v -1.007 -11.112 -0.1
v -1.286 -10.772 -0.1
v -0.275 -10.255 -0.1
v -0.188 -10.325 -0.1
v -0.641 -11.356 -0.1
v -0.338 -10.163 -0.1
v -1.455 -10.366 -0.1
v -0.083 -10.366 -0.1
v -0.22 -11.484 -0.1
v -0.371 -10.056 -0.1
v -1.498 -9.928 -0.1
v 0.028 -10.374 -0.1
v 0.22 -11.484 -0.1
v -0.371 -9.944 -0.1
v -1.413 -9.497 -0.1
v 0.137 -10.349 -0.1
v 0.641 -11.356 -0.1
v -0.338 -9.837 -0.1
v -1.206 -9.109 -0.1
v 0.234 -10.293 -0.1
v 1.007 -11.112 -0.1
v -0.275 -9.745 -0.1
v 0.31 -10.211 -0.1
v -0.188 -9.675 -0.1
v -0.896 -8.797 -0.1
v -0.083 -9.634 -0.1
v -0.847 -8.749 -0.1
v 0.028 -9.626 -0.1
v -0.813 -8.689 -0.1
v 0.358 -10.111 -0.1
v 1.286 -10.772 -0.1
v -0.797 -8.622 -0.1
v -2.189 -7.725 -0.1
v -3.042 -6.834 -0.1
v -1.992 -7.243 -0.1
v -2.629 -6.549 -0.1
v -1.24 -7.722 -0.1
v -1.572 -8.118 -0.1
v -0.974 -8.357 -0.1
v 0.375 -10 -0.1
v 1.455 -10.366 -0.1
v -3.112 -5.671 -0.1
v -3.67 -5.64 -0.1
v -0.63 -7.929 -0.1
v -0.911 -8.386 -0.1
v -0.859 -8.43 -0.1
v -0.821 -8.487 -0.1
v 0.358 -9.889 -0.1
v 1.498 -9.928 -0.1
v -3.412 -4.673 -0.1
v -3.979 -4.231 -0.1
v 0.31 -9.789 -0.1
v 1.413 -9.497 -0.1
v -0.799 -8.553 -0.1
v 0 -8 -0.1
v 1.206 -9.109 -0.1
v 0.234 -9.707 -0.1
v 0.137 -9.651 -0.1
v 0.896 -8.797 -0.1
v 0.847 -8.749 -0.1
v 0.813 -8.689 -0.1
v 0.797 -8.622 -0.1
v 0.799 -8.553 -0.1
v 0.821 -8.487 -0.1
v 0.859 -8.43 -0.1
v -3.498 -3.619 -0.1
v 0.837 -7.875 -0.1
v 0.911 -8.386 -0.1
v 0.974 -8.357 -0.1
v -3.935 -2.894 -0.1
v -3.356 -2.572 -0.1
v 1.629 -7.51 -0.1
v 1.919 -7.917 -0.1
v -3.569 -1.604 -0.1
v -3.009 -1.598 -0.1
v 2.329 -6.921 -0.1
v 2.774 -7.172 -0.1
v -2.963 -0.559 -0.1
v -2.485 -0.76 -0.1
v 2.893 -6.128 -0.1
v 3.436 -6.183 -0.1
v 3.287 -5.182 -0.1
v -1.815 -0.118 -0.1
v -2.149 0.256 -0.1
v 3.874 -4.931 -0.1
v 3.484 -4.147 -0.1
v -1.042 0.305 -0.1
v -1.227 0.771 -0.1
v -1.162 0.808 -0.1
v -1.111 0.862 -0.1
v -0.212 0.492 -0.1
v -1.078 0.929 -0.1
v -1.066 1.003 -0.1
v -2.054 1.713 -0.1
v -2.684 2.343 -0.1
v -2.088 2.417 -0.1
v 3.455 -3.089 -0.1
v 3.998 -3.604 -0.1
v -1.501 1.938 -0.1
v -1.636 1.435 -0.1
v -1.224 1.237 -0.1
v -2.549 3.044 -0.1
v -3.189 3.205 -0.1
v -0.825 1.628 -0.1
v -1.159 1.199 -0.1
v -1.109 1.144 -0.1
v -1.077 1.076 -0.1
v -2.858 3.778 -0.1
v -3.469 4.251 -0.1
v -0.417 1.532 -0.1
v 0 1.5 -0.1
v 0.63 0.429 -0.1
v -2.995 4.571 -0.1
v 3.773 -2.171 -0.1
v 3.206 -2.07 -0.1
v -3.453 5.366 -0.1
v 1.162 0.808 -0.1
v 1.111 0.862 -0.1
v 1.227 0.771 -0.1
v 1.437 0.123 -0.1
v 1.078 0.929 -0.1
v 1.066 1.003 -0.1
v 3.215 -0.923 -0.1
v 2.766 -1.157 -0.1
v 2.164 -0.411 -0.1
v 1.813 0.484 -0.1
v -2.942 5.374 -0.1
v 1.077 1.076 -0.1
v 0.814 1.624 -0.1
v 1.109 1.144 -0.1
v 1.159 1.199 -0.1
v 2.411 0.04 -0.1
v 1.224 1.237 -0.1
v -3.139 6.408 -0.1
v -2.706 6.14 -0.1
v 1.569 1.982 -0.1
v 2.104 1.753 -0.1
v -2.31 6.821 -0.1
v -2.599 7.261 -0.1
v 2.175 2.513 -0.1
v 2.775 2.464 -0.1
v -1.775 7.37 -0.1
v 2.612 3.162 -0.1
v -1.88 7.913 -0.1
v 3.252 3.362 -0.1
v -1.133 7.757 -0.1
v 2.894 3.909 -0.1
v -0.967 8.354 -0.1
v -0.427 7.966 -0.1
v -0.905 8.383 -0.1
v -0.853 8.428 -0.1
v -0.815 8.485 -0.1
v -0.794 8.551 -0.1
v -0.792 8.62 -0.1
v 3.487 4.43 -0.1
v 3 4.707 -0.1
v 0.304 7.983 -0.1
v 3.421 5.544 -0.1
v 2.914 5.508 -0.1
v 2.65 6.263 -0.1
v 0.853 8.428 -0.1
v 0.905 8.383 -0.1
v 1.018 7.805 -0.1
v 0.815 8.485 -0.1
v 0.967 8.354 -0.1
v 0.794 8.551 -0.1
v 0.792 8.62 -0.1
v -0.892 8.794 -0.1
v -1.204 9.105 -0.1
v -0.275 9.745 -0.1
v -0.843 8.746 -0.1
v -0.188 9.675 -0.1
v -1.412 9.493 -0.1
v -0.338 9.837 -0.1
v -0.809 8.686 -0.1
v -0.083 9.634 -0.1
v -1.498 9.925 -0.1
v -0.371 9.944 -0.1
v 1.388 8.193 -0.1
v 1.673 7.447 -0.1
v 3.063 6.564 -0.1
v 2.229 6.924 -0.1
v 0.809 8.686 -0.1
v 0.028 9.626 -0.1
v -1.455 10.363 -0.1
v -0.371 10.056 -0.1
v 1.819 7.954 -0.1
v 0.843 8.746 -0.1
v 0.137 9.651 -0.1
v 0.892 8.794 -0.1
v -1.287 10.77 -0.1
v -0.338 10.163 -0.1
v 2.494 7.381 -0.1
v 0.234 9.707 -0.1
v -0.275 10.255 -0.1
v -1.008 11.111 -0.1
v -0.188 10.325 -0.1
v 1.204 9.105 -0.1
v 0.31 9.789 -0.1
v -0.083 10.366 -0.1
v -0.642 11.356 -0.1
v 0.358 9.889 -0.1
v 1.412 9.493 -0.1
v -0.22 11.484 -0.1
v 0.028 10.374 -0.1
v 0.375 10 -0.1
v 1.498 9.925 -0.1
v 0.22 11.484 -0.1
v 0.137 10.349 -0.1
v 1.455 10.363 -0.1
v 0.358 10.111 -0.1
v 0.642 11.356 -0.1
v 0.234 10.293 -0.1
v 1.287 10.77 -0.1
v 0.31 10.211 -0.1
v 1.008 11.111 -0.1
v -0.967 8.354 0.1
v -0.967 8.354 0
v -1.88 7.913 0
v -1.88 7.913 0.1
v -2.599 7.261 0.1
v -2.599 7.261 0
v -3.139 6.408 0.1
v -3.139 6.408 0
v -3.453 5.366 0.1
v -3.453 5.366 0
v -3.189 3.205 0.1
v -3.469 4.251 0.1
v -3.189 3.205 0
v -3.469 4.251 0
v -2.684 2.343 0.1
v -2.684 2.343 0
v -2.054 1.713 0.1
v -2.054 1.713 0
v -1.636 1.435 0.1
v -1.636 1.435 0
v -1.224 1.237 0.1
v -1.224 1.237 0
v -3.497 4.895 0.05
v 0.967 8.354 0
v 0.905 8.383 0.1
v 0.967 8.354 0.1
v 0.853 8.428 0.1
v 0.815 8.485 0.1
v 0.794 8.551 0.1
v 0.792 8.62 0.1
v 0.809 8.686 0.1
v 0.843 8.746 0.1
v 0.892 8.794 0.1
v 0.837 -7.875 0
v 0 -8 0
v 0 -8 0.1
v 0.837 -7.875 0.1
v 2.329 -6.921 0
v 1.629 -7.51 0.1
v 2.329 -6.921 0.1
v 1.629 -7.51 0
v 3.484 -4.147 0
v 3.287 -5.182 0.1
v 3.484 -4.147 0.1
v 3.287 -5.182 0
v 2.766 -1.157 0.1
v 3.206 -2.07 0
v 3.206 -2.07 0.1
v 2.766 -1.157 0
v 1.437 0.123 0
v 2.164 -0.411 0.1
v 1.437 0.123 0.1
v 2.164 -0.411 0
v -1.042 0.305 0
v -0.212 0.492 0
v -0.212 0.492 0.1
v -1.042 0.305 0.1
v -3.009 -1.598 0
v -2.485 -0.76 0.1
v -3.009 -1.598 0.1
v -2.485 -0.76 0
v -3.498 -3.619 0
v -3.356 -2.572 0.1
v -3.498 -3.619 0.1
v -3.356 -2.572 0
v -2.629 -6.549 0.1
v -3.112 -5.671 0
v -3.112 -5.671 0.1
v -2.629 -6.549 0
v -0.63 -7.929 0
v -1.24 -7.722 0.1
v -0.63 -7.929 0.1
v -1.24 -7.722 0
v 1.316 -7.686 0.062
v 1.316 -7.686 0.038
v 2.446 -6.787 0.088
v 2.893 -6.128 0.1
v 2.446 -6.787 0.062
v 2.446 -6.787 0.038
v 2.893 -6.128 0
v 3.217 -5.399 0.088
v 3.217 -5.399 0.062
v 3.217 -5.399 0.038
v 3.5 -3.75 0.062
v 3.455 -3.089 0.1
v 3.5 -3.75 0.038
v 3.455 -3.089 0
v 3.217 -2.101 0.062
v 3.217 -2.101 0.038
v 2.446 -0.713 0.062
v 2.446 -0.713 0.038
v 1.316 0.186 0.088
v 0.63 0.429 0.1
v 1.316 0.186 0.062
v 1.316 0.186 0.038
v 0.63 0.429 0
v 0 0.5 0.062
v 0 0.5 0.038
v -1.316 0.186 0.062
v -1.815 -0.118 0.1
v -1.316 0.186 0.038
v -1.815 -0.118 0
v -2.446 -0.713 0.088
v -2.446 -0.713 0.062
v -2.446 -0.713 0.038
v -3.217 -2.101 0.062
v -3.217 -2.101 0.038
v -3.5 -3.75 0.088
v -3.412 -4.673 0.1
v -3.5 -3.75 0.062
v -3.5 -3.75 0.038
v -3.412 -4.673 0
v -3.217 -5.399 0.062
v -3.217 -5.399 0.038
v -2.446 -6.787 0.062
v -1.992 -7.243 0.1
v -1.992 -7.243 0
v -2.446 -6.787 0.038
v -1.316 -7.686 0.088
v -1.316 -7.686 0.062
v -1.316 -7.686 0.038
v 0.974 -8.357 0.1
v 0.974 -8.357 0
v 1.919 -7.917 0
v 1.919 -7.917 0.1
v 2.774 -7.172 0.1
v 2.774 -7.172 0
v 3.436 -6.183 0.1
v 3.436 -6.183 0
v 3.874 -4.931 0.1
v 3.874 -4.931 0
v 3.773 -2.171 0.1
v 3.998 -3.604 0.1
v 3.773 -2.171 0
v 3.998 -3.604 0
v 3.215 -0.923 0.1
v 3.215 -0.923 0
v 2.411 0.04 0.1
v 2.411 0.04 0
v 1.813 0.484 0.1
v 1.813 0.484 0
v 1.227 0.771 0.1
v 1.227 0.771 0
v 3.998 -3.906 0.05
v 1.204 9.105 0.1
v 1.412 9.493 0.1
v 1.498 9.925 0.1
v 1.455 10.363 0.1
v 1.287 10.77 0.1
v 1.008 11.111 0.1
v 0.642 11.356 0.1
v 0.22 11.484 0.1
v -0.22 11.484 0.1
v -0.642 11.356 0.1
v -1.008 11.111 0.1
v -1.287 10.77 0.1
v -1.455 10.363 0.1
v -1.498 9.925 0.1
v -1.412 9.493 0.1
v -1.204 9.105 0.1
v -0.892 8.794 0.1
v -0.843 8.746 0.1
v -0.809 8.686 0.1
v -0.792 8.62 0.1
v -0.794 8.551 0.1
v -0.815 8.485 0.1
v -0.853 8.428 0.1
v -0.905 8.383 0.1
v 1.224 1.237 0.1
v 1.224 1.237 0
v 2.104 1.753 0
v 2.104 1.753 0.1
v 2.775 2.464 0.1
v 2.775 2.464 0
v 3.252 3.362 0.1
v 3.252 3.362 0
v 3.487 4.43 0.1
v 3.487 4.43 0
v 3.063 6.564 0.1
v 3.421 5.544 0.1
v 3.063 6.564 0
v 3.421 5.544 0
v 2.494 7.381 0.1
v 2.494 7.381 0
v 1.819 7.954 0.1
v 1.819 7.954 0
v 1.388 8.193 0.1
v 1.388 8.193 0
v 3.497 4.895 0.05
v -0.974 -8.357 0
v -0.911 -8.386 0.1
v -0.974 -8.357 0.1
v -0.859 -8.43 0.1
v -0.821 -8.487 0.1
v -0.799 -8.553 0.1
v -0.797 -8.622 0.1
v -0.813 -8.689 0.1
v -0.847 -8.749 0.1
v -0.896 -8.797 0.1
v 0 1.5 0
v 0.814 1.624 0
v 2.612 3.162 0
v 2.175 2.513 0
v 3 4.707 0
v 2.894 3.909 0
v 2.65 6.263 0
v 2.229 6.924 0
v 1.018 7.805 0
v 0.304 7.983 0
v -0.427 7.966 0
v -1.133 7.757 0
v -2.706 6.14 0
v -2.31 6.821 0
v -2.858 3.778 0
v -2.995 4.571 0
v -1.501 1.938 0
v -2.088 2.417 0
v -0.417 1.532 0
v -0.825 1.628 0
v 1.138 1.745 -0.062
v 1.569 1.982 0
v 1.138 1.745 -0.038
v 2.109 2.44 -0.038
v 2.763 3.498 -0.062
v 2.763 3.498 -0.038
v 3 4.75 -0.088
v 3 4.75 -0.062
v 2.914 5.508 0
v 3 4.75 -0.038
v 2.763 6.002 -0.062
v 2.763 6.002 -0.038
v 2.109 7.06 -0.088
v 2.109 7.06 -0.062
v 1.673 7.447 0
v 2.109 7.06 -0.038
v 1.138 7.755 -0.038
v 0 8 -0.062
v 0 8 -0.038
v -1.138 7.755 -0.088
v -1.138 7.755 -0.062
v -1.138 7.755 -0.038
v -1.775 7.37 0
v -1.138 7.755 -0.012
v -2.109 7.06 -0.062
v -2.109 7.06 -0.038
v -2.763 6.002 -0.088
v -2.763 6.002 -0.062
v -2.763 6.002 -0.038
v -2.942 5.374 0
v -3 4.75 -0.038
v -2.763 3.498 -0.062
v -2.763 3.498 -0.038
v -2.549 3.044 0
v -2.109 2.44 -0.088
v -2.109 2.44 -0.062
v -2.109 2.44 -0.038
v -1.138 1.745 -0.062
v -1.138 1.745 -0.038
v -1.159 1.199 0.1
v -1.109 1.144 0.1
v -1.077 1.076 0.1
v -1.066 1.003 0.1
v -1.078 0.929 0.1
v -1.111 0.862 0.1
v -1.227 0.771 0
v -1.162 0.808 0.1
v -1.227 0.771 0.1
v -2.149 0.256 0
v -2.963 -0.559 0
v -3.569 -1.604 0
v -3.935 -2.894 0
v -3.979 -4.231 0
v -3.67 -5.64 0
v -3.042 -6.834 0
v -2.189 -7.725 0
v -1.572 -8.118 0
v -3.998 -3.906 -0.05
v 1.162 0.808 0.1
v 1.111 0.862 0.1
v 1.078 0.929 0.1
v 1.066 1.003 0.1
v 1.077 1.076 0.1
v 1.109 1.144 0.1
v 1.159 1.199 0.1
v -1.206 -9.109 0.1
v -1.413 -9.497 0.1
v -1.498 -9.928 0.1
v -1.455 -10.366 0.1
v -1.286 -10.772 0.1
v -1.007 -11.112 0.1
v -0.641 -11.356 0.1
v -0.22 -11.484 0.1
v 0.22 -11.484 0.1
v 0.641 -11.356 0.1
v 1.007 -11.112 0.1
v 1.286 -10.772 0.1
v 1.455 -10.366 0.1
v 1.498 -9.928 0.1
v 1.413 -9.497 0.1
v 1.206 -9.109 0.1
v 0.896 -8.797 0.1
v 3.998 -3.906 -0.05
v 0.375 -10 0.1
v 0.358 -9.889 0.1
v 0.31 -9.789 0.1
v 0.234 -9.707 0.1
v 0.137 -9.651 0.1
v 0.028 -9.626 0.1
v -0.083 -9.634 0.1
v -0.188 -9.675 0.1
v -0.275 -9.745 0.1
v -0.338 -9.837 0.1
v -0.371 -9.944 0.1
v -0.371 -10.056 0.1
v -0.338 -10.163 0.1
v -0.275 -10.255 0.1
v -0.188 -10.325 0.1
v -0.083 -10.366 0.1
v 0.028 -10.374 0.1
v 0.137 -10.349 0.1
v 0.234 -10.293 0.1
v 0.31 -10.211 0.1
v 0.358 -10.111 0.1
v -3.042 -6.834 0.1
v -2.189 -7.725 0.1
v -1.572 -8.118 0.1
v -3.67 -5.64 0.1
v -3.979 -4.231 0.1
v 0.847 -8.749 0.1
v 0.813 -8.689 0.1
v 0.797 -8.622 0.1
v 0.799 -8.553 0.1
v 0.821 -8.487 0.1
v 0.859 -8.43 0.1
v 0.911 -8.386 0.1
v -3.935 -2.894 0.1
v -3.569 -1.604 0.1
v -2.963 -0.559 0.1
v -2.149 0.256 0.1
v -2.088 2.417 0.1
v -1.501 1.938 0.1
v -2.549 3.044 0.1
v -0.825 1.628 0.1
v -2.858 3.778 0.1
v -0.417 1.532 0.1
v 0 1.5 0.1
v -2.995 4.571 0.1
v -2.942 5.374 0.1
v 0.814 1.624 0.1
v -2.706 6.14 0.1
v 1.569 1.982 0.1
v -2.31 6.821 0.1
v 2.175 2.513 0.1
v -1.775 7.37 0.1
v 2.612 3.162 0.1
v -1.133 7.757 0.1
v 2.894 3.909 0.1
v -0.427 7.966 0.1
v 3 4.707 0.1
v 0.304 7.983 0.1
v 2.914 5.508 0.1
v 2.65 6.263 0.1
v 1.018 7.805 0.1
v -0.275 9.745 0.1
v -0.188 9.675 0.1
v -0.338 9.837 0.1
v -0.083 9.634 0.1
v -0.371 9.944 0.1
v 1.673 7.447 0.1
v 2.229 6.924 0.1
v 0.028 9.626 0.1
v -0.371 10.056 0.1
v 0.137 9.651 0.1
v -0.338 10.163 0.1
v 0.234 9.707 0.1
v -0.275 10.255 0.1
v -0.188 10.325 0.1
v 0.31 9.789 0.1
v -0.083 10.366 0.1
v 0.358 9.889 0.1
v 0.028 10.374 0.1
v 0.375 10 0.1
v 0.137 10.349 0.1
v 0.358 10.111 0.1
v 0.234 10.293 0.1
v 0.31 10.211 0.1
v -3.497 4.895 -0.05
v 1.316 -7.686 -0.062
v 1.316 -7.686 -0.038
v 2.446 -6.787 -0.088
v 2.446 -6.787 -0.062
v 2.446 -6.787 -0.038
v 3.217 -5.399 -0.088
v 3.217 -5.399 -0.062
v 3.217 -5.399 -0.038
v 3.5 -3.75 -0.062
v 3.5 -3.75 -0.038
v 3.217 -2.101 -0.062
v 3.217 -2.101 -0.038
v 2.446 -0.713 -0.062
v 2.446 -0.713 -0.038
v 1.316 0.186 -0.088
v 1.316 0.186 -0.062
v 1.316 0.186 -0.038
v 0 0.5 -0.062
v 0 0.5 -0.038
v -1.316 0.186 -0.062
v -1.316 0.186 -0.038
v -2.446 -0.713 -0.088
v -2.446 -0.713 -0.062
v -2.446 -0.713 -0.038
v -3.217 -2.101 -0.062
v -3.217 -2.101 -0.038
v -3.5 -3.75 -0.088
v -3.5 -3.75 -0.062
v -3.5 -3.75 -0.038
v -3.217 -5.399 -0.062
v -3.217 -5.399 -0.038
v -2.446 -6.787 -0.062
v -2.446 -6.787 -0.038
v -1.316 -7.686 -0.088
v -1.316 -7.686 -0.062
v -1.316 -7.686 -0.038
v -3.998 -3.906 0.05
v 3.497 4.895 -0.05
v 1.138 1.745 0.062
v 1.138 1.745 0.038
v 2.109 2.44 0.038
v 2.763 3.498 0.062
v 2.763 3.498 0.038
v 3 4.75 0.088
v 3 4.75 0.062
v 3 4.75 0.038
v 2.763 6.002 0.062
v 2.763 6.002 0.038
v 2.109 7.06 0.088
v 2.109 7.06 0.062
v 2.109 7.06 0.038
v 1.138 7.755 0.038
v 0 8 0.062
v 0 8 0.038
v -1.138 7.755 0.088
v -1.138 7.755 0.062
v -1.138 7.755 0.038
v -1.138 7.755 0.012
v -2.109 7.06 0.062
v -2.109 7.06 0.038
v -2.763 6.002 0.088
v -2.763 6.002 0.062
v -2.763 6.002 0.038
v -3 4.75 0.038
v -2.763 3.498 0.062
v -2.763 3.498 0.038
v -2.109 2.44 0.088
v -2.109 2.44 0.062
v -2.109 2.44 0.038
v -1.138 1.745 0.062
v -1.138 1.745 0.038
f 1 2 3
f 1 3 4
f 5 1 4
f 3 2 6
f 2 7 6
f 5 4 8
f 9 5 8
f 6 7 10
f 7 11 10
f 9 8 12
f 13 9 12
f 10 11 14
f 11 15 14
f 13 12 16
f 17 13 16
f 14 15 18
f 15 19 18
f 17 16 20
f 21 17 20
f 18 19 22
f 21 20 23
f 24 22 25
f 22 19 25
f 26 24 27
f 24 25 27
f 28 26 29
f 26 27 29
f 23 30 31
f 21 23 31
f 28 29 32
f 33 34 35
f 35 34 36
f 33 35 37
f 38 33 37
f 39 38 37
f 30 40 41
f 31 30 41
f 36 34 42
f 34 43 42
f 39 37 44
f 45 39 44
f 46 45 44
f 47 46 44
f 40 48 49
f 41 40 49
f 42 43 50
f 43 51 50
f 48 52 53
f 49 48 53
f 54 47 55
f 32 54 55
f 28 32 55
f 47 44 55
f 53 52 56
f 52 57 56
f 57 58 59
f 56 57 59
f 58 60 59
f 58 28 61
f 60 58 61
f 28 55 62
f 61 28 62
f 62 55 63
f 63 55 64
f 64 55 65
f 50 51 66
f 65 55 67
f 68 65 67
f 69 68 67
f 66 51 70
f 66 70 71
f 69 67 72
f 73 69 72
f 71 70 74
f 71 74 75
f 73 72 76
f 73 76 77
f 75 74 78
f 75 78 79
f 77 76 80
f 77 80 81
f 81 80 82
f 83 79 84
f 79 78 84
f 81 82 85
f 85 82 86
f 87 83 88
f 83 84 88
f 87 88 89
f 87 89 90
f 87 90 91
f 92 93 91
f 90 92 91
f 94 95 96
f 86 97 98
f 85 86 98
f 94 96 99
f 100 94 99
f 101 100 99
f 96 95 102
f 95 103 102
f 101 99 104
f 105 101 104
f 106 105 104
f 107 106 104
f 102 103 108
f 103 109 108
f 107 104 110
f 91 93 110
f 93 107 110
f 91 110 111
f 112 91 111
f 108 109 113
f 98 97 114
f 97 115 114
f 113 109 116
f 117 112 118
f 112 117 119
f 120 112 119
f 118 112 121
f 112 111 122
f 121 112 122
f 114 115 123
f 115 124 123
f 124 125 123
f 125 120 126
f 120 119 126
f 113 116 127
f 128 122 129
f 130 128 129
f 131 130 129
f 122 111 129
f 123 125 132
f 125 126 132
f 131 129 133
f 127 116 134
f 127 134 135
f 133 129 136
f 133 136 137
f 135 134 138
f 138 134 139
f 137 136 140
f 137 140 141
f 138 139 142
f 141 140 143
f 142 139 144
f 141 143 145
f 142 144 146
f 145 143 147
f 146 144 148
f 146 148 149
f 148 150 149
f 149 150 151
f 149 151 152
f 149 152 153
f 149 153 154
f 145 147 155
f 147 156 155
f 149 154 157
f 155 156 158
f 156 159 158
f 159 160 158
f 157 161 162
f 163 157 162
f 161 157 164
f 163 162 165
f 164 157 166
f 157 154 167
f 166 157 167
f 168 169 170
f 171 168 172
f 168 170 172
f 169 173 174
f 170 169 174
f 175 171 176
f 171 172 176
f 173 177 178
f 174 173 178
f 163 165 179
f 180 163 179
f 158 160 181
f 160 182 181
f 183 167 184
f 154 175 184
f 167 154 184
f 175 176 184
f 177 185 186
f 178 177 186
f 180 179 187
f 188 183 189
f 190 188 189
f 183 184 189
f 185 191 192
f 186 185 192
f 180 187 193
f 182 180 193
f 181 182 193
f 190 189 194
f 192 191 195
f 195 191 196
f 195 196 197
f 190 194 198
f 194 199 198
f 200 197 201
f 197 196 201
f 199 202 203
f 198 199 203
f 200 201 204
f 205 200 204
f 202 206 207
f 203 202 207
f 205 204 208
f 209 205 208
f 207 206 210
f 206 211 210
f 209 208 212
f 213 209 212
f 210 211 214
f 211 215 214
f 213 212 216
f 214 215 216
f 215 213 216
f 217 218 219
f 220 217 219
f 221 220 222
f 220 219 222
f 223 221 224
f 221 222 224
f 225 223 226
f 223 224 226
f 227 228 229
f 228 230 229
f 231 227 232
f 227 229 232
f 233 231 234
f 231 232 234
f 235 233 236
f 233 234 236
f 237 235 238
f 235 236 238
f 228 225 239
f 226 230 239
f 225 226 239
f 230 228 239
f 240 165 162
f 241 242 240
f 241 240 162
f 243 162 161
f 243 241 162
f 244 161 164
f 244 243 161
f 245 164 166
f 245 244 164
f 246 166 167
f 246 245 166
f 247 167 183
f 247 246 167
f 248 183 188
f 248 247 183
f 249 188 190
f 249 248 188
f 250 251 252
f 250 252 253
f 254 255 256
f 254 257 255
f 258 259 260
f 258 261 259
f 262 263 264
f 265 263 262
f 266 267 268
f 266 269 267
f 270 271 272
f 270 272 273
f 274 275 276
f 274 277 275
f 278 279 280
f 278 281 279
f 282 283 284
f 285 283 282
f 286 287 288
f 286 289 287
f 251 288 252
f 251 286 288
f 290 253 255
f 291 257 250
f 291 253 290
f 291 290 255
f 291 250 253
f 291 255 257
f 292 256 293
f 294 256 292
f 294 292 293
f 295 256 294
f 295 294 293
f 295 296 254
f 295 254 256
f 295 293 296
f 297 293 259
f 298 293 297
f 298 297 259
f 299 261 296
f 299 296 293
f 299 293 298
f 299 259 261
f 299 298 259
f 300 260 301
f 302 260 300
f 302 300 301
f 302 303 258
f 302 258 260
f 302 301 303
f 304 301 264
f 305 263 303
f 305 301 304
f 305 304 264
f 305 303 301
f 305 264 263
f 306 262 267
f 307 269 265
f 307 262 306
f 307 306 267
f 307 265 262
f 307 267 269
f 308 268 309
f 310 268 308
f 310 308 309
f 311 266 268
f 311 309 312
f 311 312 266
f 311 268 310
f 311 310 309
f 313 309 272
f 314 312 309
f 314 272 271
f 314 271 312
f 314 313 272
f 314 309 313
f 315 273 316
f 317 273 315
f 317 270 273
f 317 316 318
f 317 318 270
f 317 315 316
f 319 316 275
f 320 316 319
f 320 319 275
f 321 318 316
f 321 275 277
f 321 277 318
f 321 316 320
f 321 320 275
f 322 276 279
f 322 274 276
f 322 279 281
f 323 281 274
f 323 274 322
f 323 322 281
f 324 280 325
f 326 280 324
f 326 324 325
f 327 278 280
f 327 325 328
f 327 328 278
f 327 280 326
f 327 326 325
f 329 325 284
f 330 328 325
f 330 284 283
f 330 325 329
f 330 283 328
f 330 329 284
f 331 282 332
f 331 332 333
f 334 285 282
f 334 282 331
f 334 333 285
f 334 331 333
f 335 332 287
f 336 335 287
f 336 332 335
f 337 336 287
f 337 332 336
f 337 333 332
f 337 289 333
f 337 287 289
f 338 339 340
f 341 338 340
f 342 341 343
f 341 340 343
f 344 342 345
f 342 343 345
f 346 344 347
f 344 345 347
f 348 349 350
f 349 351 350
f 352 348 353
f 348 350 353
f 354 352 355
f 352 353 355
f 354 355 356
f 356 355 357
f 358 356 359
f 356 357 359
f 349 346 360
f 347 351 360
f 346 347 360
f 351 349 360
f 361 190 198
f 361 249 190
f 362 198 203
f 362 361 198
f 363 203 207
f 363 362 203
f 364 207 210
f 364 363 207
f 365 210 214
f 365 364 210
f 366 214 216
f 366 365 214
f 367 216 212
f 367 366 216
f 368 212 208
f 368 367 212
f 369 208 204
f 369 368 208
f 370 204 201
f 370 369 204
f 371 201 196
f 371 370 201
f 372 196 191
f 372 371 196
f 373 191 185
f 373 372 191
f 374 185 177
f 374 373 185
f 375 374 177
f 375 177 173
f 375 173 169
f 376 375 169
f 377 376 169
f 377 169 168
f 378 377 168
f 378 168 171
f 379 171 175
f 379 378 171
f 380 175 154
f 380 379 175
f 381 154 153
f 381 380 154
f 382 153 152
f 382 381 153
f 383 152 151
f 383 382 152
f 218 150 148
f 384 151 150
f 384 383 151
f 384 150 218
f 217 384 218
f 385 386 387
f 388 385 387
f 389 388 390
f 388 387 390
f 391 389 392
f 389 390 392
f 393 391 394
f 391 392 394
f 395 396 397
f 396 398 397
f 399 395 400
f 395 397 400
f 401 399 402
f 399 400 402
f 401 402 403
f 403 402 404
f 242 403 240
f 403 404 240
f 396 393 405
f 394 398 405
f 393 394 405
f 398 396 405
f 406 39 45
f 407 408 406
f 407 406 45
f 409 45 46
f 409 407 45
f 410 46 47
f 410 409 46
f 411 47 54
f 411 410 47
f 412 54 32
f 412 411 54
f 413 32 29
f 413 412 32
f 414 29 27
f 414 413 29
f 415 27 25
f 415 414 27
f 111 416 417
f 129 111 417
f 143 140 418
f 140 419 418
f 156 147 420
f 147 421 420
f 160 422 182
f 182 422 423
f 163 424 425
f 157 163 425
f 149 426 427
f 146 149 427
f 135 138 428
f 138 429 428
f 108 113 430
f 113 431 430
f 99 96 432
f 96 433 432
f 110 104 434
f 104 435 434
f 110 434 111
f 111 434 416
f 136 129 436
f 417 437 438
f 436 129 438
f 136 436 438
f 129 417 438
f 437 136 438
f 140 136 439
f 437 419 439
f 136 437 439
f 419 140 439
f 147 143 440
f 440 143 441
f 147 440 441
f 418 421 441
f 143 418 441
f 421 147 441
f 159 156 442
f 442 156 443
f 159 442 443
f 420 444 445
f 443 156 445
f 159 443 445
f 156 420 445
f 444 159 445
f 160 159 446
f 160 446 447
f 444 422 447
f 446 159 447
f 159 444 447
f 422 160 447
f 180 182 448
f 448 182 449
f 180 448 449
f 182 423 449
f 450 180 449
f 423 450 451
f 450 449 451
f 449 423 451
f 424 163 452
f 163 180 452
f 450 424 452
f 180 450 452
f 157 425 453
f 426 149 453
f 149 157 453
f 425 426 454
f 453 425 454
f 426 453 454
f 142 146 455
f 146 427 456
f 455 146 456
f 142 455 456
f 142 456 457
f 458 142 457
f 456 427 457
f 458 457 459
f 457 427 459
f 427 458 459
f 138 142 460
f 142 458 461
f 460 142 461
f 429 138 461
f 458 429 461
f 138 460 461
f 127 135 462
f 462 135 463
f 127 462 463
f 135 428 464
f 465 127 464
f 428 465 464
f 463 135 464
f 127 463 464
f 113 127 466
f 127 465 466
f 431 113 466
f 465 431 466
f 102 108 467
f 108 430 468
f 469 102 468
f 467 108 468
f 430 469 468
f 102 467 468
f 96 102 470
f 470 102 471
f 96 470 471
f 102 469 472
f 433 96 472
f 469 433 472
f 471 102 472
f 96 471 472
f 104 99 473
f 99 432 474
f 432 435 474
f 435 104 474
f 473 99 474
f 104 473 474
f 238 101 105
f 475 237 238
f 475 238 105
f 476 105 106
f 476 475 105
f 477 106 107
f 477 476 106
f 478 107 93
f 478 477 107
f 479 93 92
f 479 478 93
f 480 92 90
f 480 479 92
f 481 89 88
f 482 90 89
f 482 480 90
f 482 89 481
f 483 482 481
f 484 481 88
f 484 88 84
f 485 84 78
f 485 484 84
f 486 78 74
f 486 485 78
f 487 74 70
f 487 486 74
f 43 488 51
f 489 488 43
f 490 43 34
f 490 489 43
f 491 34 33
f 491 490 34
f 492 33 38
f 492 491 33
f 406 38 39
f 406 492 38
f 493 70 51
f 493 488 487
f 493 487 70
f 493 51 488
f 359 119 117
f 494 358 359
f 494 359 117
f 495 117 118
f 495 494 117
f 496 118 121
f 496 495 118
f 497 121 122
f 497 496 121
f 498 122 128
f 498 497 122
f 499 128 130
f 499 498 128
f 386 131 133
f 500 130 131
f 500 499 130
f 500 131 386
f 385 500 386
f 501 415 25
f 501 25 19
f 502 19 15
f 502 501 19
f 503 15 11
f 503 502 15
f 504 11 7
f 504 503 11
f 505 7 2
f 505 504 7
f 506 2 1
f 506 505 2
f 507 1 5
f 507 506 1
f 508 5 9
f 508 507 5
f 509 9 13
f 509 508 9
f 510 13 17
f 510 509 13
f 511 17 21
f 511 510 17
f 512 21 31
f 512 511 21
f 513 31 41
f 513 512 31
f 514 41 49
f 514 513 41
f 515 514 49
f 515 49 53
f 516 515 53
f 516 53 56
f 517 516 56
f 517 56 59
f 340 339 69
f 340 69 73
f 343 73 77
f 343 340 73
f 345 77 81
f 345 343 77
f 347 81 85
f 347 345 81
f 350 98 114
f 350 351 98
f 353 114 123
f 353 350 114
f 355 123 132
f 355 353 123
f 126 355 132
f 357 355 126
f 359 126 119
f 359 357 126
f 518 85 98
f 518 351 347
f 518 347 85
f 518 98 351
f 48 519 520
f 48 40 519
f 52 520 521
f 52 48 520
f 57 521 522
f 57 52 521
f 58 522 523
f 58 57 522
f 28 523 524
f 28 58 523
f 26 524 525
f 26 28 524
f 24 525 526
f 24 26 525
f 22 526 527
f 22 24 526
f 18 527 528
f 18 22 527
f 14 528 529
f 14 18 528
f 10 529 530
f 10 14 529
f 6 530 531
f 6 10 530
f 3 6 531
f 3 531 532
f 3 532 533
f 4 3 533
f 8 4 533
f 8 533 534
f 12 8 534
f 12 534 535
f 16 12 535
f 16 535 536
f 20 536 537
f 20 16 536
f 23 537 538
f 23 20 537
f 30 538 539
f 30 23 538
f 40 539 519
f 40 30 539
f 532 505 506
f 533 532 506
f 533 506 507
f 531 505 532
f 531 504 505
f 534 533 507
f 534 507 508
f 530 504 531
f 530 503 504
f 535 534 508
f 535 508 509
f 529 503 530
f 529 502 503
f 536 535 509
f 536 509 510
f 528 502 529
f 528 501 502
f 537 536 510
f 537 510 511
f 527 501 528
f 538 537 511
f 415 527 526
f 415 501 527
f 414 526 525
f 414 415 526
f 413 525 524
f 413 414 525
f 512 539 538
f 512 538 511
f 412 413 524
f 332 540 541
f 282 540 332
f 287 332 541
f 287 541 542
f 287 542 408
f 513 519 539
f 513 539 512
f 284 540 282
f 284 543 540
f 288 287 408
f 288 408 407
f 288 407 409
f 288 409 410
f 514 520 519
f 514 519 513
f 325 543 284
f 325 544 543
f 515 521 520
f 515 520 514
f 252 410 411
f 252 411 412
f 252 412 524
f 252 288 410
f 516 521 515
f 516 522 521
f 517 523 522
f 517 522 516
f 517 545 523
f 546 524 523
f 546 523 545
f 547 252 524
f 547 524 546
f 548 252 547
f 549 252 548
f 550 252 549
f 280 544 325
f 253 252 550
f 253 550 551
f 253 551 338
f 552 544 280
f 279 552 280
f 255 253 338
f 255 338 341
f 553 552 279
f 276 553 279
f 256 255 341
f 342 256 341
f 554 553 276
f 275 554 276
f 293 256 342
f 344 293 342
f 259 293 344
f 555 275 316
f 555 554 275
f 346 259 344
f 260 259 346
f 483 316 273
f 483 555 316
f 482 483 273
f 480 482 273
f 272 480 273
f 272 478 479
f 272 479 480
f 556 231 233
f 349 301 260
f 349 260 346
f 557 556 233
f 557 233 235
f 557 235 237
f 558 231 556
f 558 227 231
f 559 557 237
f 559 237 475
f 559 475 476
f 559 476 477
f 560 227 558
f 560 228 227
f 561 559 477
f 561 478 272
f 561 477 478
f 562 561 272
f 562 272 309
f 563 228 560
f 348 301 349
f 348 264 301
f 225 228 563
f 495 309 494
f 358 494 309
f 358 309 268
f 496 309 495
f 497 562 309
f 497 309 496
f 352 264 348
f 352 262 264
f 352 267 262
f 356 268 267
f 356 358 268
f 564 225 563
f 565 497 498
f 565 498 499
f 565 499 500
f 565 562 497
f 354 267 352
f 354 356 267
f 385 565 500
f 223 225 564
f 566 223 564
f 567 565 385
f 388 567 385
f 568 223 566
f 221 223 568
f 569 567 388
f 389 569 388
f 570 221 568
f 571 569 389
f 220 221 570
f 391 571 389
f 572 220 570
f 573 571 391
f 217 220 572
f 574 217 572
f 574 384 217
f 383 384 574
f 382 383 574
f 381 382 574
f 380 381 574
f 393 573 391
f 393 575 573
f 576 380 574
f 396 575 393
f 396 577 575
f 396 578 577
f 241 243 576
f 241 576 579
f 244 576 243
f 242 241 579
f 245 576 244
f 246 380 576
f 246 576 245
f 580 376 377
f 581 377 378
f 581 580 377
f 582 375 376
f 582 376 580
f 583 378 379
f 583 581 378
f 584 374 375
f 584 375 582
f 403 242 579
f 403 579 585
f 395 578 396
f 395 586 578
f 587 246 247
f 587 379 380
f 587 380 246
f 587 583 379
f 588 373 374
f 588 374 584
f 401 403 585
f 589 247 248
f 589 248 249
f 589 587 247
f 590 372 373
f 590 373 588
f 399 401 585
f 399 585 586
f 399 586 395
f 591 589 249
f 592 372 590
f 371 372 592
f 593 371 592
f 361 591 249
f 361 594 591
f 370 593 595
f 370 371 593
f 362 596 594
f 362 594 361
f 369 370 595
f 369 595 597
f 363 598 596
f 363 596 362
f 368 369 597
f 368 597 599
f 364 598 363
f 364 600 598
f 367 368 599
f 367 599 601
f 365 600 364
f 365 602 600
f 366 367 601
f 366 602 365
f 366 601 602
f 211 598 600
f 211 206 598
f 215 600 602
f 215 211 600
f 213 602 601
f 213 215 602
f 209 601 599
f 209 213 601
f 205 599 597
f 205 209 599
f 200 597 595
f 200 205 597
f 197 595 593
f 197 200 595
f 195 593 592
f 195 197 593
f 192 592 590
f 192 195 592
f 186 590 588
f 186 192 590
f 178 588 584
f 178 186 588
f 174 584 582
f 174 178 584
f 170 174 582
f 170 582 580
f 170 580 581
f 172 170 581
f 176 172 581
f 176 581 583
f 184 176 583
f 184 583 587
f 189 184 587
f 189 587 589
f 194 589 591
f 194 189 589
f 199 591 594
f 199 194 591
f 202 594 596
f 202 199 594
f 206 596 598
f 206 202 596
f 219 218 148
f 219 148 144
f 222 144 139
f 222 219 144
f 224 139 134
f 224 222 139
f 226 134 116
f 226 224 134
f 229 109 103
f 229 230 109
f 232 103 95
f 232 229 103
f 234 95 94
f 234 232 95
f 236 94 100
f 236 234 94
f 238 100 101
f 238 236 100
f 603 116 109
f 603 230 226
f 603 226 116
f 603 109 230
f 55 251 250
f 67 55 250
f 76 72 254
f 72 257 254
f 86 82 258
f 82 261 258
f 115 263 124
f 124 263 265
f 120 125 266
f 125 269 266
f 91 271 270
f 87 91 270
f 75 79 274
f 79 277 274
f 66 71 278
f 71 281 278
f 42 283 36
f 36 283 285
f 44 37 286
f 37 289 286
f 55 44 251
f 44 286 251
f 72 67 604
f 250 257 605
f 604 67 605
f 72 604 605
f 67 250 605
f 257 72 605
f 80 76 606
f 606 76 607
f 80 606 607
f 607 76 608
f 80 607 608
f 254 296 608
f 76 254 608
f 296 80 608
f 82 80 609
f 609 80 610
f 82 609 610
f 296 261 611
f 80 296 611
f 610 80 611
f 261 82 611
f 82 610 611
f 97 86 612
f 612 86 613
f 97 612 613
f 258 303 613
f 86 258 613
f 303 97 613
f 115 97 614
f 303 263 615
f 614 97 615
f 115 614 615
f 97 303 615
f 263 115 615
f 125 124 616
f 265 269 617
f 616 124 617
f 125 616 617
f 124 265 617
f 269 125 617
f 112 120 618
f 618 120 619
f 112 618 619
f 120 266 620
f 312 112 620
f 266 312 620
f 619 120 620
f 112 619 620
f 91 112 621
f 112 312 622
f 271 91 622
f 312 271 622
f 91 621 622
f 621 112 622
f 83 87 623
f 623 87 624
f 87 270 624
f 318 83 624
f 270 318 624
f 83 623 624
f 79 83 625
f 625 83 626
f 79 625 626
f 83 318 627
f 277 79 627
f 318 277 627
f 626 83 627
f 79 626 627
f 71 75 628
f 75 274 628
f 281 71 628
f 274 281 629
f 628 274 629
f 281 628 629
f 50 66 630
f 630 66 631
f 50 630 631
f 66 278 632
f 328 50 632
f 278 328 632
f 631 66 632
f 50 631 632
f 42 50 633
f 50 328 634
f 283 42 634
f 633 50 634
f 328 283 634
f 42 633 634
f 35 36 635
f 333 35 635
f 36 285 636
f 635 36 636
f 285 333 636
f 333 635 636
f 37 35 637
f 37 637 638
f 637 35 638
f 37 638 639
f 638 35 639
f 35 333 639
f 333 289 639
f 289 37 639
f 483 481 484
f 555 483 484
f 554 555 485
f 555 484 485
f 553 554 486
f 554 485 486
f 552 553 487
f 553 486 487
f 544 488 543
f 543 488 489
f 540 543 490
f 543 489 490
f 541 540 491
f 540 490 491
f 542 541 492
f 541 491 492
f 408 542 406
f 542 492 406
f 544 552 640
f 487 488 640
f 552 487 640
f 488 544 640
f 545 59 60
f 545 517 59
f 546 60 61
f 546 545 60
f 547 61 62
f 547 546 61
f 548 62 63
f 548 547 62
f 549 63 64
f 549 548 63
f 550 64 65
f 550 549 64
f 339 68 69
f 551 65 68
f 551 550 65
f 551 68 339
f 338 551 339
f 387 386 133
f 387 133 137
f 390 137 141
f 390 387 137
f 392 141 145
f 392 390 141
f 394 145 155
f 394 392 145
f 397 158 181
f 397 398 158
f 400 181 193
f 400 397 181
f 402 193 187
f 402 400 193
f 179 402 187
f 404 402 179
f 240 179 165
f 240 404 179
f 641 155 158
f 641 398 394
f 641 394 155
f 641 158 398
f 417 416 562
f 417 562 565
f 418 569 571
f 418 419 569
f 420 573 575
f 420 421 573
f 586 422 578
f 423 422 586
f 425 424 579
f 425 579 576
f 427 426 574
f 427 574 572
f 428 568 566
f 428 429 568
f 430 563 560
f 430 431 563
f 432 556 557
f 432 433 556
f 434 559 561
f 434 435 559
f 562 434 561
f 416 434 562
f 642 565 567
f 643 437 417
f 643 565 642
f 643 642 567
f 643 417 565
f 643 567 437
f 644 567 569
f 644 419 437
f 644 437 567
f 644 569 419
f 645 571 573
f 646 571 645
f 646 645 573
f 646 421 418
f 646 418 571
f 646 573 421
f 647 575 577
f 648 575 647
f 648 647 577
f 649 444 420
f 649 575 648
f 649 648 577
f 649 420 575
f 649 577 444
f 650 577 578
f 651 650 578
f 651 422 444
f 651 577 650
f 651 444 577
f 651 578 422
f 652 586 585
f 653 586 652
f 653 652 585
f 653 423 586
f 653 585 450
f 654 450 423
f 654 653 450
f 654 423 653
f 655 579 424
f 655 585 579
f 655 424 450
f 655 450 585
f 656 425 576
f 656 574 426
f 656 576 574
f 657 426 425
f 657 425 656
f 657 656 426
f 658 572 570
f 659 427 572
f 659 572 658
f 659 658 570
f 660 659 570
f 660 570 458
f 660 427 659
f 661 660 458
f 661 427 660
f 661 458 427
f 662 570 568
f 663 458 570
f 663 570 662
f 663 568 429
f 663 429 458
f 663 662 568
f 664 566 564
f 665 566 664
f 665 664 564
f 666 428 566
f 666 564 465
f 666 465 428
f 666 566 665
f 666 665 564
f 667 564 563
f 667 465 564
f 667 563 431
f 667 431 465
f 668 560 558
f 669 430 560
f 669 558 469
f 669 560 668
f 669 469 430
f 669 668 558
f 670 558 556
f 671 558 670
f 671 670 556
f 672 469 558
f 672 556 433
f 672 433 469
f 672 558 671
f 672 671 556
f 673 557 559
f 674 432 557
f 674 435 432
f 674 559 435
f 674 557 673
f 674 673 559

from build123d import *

# Parameters (mm, degrees)
SKETCH1_R           = 0.375
BOSS_EXTRUDE1_DEPTH = 0.1


with BuildPart() as part:
    # Sketch1 → Boss-Extrude1 (new, symmetric)
    with BuildSketch(Plane.XY):
        with BuildLine():
            ThreePointArc((0.891905879, 8.793971848), (0, 11.5), (-0.891905879, 8.793971848))
            ThreePointArc((-0.891905879, 8.793971848), (-0.794118372, 8.550918705), (-0.966968535, 8.354042987))
            add(Edge.make_bspline(
                [(-0.966968535, 8.354042987), (-11.16779536, 5.212201996), (-1.223571036, 1.236616962)],
                knots=[0.279917878, 0.279917878, 0.279917878, 2.784457357, 2.784457357, 2.784457357], degree=2, weights=[1, 0.313167604, 1]))
            ThreePointArc((-1.223571036, 1.236616962), (-1.066383194, 1.002630817), (-1.227016785, 0.770996659))
            add(Edge.make_bspline(
                [(-1.227016785, 0.770996659), (-14.522838837, -4.317608433), (-0.974024897, -8.357021838)],
                knots=[3.453373589, 3.453373589, 3.453373589, 6.037206048, 6.037206048, 6.037206048], degree=2, weights=[1, 0.275279187, 1]))
            ThreePointArc((-0.974024897, -8.357021838), (-0.799281912, -8.553011125), (-0.896102103, -8.797086445))
            ThreePointArc((-0.896102103, -8.797086445), (0, -11.5), (0.896102103, -8.797086445))
            ThreePointArc((0.896102103, -8.797086445), (0.799281912, -8.553011125), (0.974024897, -8.357021838))
            add(Edge.make_bspline(
                [(0.974024897, -8.357021838), (14.522838837, -4.317608433), (1.227016785, 0.770996659)],
                knots=[0.245979259, 0.245979259, 0.245979259, 2.829811718, 2.829811718, 2.829811718], degree=2, weights=[1, 0.275279187, 1]))
            ThreePointArc((1.227016785, 0.770996659), (1.066383194, 1.002630817), (1.223571036, 1.236616962))
            add(Edge.make_bspline(
                [(1.223571036, 1.236616962), (11.16779536, 5.212201996), (0.966968535, 8.354042987)],
                knots=[3.49872795, 3.49872795, 3.49872795, 6.003267429, 6.003267429, 6.003267429], degree=2, weights=[1, 0.313167604, 1]))
            ThreePointArc((0.966968535, 8.354042987), (0.794118372, 8.550918705), (0.891905879, 8.793971848))
        make_face()
        with Locations((0, 10)):
            Circle(SKETCH1_R, mode=Mode.SUBTRACT)
        with Locations((0, -10)):
            Circle(SKETCH1_R, mode=Mode.SUBTRACT)
        with BuildLine():
            add(Edge.make_bspline(
                [(0, 1.5), (0.7767692, 1.5), (2.3303076, 2.182014907), (3.3348462, 4.75), (2.3303076, 7.317985093), (0, 8.341007453), (-2.3303076, 7.317985093), (-3.3348462, 4.75), (-2.3303076, 2.182014907), (-0.7767692, 1.5), (0, 1.5)],
                knots=[0, 0, 0, 0, 0.785398163, 1.570796327, 2.35619449, 3.141592654, 3.926990817, 4.71238898, 5.497787144, 6.283185307, 6.283185307, 6.283185307, 6.283185307], degree=3))
        make_face(mode=Mode.SUBTRACT)
        with BuildLine():
            add(Edge.make_bspline(
                [(0, -8), (0.897698015, -8), (2.693094044, -7.134324579), (3.903452978, -3.75), (2.693094044, -0.365675421), (0, 0.932837711), (-2.693094044, -0.365675421), (-3.903452978, -3.75), (-2.693094044, -7.134324579), (-0.897698015, -8), (0, -8)],
                knots=[0, 0, 0, 0, 0.785398163, 1.570796327, 2.35619449, 3.141592654, 3.926990817, 4.71238898, 5.497787144, 6.283185307, 6.283185307, 6.283185307, 6.283185307], degree=3))
        make_face(mode=Mode.SUBTRACT)
    extrude(amount=BOSS_EXTRUDE1_DEPTH, both=True)


solid = part.part
